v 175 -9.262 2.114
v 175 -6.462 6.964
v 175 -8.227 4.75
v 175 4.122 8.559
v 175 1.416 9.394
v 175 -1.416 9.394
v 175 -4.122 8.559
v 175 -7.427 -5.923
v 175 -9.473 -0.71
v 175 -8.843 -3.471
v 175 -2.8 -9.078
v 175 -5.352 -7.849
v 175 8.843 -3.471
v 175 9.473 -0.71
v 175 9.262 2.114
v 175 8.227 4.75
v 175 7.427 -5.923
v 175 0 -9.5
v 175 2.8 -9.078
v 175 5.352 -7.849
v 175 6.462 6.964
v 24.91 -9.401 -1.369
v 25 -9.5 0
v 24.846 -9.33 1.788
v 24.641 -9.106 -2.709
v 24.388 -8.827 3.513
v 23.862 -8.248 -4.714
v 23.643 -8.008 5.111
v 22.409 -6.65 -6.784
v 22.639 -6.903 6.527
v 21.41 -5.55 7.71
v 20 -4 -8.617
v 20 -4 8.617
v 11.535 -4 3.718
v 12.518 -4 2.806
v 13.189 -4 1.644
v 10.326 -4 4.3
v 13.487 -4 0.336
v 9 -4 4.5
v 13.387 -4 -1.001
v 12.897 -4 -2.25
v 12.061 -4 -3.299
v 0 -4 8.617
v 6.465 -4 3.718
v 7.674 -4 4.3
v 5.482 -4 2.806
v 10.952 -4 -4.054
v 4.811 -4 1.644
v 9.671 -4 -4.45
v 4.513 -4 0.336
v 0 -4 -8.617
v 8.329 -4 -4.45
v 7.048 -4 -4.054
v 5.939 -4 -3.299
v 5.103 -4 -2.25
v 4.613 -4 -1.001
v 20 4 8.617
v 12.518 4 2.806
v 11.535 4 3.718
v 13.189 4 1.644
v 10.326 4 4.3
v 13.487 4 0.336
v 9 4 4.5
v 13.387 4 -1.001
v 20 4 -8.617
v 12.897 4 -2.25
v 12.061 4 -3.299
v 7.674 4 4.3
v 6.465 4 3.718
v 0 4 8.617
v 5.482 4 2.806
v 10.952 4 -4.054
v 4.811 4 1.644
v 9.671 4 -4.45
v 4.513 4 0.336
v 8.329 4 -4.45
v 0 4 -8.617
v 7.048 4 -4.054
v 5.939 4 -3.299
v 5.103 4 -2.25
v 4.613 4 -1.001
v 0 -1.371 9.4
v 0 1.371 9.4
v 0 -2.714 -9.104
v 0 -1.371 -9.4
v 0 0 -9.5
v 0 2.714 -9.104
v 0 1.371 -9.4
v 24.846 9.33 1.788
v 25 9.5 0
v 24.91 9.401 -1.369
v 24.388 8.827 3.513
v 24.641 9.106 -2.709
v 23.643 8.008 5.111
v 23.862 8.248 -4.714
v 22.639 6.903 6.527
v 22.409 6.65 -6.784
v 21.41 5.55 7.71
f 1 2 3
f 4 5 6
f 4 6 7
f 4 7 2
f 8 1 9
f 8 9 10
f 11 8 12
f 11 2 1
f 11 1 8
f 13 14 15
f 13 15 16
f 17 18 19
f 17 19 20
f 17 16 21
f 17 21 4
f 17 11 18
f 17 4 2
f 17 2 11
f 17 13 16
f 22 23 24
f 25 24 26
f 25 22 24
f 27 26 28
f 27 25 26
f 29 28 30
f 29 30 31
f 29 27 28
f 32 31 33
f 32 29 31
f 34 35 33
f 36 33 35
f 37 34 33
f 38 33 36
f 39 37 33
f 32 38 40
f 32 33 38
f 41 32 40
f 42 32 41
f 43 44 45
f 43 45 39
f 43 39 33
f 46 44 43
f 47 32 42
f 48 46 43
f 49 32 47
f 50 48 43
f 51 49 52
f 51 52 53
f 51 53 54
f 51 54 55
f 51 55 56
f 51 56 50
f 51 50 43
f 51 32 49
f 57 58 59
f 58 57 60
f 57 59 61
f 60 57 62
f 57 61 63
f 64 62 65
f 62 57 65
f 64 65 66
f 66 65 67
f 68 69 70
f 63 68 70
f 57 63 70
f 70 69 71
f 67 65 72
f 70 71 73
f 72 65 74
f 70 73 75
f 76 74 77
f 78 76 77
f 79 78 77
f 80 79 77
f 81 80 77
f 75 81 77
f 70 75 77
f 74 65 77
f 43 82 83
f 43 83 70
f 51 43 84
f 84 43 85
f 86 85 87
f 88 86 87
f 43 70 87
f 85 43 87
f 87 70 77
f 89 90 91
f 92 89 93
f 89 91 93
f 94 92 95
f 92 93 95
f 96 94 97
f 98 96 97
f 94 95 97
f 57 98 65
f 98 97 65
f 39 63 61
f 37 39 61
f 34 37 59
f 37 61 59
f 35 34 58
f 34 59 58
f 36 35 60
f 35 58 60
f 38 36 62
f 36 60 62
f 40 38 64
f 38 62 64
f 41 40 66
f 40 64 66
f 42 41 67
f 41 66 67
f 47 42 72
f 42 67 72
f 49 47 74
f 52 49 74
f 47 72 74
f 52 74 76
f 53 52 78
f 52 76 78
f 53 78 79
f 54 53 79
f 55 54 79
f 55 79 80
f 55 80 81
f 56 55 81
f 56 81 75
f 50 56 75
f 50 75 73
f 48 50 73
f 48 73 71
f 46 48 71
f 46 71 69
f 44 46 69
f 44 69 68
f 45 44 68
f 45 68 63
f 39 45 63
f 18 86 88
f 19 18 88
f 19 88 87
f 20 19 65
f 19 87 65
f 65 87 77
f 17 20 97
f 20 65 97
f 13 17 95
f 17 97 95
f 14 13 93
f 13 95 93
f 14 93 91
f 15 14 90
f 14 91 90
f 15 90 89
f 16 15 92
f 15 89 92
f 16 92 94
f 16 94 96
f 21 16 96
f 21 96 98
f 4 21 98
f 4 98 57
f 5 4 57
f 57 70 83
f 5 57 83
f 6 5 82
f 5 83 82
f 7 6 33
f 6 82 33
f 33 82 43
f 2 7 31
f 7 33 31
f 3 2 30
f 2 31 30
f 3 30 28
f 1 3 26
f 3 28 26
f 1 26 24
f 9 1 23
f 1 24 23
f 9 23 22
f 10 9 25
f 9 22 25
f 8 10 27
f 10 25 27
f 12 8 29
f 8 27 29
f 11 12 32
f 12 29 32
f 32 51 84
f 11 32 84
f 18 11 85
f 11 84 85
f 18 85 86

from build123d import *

# Parameters (mm, degrees)
SKETCH1_R               = 9.5
BOSS_EXTRUDE1_DEPTH     = 175
CUT_EXTRUDE1_DEPTH      = 176.514956628
CUT_EXTRUDE1_DEPTH_BACK = 176.514956628
SKETCH4_R               = 4.5
CUT_EXTRUDE2_DEPTH      = 176.776847167


with BuildPart() as part:
    # Sketch1 → Boss-Extrude1 (new body)
    with BuildSketch(Plane(origin=(0, 0, 0), x_dir=(0, 0, -1), z_dir=(1, 0, 0))):
        Circle(SKETCH1_R)
    extrude(amount=BOSS_EXTRUDE1_DEPTH)

    # Sketch3 → Cut-Extrude1 (cut, two sides: drawn at the far end of the back side and taken through both)
    with BuildSketch(Plane.XY.offset(-CUT_EXTRUDE1_DEPTH_BACK)):
        Polygon((20, 4), (0, 4), (0, 9.5), (25, 9.5), align=None)
        Polygon((20, -4), (0, -4), (0, -9.5), (25, -9.5), align=None)
    extrude(amount=CUT_EXTRUDE1_DEPTH + CUT_EXTRUDE1_DEPTH_BACK, mode=Mode.SUBTRACT)

    # Sketch4 → Cut-Extrude2 (cut, through all)
    with BuildSketch(Plane(origin=(0, 4, 0), x_dir=(1, 0, 0), z_dir=(0, 1, 0))):
        with Locations(Location((9, 0, 0), (0, 0, 270))):
            Circle(SKETCH4_R)
    extrude(amount=-CUT_EXTRUDE2_DEPTH, mode=Mode.SUBTRACT)


solid = part.part
